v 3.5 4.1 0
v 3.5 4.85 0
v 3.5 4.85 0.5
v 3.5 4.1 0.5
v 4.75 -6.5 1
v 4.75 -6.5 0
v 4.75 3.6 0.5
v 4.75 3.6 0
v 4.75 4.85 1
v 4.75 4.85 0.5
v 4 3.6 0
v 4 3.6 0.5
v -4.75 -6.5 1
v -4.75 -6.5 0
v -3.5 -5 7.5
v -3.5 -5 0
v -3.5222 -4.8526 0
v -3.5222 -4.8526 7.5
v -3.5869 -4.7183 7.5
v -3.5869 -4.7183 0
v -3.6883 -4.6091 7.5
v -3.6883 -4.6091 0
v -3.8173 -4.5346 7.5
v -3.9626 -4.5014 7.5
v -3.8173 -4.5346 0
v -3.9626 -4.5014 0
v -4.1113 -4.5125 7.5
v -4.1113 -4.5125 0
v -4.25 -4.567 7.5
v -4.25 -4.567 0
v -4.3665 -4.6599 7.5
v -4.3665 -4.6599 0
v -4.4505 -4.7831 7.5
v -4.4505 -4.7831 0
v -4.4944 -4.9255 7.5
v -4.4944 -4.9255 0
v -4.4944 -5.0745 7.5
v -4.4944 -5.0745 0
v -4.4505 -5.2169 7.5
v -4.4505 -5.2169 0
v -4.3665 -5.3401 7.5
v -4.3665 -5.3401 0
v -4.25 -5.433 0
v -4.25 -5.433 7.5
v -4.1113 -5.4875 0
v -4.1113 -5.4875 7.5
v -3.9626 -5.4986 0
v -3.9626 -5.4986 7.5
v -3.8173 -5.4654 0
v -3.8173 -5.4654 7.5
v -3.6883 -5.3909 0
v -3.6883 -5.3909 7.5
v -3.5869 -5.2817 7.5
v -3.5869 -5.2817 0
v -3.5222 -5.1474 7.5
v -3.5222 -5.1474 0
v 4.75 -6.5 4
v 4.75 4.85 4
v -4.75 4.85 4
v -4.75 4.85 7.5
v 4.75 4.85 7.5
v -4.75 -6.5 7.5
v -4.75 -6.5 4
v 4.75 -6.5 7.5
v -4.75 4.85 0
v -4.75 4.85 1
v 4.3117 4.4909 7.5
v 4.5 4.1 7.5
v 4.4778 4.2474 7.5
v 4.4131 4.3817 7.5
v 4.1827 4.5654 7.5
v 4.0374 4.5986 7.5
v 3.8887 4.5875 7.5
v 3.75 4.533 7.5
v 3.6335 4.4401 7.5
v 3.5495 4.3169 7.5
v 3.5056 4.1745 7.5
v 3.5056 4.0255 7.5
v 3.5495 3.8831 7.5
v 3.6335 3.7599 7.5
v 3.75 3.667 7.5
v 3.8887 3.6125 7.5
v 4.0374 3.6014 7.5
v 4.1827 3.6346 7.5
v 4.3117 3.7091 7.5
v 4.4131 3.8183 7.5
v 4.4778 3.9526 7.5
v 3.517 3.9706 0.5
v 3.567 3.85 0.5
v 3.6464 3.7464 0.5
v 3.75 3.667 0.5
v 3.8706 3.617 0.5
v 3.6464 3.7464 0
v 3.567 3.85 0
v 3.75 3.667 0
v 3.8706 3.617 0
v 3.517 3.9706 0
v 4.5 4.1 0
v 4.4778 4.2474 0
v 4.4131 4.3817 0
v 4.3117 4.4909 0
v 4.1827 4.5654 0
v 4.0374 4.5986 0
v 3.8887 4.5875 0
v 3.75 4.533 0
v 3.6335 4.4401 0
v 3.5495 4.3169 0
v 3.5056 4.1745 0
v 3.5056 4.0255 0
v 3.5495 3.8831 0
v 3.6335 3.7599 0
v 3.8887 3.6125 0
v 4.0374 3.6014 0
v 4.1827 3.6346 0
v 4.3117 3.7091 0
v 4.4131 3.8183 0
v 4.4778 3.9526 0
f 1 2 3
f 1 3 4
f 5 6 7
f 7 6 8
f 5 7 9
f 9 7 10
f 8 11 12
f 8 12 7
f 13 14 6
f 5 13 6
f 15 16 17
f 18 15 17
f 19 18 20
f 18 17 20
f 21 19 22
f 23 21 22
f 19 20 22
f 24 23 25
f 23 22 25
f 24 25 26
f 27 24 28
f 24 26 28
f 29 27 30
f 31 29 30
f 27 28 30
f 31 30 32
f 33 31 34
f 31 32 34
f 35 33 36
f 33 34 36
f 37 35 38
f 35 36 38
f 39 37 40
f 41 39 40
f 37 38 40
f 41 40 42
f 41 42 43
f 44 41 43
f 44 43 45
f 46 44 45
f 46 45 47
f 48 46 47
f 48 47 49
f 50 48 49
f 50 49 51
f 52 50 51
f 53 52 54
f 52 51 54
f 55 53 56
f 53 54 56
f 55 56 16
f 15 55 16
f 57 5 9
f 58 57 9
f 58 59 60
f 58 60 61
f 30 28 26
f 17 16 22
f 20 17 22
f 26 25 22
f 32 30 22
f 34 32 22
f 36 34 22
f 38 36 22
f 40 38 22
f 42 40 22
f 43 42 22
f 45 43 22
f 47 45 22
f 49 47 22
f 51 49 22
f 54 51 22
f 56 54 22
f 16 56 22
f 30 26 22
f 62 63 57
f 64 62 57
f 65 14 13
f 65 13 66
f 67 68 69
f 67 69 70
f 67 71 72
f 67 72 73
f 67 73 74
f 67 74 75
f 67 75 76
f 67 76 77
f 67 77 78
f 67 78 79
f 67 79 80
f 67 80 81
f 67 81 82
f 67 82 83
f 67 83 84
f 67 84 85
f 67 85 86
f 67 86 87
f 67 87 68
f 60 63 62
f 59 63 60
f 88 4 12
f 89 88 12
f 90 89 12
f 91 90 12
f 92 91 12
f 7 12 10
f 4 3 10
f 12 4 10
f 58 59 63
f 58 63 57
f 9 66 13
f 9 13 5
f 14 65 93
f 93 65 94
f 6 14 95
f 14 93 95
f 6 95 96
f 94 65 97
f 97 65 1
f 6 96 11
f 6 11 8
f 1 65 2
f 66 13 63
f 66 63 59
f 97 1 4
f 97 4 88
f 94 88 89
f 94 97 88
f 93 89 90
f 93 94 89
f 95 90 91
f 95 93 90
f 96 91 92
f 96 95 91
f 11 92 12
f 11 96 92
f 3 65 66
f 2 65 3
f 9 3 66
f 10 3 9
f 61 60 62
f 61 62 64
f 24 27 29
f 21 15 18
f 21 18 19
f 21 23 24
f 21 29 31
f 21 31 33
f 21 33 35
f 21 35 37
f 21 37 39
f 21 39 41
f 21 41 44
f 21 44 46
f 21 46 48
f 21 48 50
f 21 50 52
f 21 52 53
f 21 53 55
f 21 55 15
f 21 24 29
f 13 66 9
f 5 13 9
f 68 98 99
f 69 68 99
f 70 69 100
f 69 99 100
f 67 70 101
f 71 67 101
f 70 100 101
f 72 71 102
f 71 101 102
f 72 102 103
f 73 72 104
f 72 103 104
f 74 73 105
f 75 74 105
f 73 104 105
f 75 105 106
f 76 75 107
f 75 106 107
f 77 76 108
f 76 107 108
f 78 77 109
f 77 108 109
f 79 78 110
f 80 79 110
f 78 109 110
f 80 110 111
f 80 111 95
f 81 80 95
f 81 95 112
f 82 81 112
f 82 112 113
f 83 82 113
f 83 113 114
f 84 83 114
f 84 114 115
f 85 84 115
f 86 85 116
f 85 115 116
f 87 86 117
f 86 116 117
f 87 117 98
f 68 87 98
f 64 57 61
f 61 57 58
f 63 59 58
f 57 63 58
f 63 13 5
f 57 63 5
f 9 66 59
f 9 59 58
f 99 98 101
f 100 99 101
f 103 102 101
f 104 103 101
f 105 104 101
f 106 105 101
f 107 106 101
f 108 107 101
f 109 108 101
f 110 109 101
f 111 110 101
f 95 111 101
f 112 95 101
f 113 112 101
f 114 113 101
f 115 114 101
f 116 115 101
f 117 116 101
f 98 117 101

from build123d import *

# Parameters (mm, degrees)
SKETCH_W     = 9.5
SKETCH_H     = 11.35
PAD_DEPTH    = 1
POCKET_DEPTH = 0.5
SKETCH001_W  = 9.5
SKETCH001_H  = 11.35
PAD001_DEPTH = 3
SKETCH002_W  = 9.5
SKETCH002_H  = 11.35
PAD002_DEPTH = 3.5
SKETCH003_R  = 0.5
PAD003_DEPTH = 7.5
SKETCH004_R  = 0.5
PAD004_DEPTH = 7.5


with BuildPart() as bodybottom:
    # Sketch (on DatumPlane) → Pad (new body)
    with BuildSketch(Plane.XY):
        with Locations((0, -0.825)):
            Rectangle(SKETCH_W, SKETCH_H)
    extrude(amount=PAD_DEPTH)

    # Sketch005 (on DatumPlane) → Pocket (cut)
    with BuildSketch(Plane.XY):
        with BuildLine():
            Line((4, 3.6), (4.75, 3.6))
            Line((4.75, 3.6), (4.75, 4.85))
            Line((4.75, 4.85), (3.5, 4.85))
            Line((3.5, 4.85), (3.5, 4.1))
            ThreePointArc((3.5, 4.1), (3.646447, 3.746447), (4, 3.6))
        make_face()
    extrude(amount=POCKET_DEPTH, mode=Mode.SUBTRACT)


with BuildPart() as bodymiddle:
    # Sketch001 (on DatumPlane) → Pad001 (new body)
    with BuildSketch(Plane.XY.offset(1)):
        with Locations((0, -0.825)):
            Rectangle(SKETCH001_W, SKETCH001_H)
    extrude(amount=PAD001_DEPTH)


with BuildPart() as bodytop:
    # Sketch002 (on DatumPlane) → Pad002 (new body)
    with BuildSketch(Plane.XY.offset(4)):
        with Locations((0, -0.825)):
            Rectangle(SKETCH002_W, SKETCH002_H)
    extrude(amount=PAD002_DEPTH)


with BuildPart() as rivet1:
    # Sketch003 (on DatumPlane) → Pad003 (new body)
    with BuildSketch(Plane.XY):
        with Locations((4, 4.1)):
            Circle(SKETCH003_R)
    extrude(amount=PAD003_DEPTH)


with BuildPart() as rivet2:
    # Sketch004 (on DatumPlane) → Pad004 (new body)
    with BuildSketch(Plane.XY):
        with Locations((-4, -5)):
            Circle(SKETCH004_R)
    extrude(amount=PAD004_DEPTH)


solid = Compound([bodybottom.part, bodymiddle.part, bodytop.part, rivet1.part, rivet2.part])
